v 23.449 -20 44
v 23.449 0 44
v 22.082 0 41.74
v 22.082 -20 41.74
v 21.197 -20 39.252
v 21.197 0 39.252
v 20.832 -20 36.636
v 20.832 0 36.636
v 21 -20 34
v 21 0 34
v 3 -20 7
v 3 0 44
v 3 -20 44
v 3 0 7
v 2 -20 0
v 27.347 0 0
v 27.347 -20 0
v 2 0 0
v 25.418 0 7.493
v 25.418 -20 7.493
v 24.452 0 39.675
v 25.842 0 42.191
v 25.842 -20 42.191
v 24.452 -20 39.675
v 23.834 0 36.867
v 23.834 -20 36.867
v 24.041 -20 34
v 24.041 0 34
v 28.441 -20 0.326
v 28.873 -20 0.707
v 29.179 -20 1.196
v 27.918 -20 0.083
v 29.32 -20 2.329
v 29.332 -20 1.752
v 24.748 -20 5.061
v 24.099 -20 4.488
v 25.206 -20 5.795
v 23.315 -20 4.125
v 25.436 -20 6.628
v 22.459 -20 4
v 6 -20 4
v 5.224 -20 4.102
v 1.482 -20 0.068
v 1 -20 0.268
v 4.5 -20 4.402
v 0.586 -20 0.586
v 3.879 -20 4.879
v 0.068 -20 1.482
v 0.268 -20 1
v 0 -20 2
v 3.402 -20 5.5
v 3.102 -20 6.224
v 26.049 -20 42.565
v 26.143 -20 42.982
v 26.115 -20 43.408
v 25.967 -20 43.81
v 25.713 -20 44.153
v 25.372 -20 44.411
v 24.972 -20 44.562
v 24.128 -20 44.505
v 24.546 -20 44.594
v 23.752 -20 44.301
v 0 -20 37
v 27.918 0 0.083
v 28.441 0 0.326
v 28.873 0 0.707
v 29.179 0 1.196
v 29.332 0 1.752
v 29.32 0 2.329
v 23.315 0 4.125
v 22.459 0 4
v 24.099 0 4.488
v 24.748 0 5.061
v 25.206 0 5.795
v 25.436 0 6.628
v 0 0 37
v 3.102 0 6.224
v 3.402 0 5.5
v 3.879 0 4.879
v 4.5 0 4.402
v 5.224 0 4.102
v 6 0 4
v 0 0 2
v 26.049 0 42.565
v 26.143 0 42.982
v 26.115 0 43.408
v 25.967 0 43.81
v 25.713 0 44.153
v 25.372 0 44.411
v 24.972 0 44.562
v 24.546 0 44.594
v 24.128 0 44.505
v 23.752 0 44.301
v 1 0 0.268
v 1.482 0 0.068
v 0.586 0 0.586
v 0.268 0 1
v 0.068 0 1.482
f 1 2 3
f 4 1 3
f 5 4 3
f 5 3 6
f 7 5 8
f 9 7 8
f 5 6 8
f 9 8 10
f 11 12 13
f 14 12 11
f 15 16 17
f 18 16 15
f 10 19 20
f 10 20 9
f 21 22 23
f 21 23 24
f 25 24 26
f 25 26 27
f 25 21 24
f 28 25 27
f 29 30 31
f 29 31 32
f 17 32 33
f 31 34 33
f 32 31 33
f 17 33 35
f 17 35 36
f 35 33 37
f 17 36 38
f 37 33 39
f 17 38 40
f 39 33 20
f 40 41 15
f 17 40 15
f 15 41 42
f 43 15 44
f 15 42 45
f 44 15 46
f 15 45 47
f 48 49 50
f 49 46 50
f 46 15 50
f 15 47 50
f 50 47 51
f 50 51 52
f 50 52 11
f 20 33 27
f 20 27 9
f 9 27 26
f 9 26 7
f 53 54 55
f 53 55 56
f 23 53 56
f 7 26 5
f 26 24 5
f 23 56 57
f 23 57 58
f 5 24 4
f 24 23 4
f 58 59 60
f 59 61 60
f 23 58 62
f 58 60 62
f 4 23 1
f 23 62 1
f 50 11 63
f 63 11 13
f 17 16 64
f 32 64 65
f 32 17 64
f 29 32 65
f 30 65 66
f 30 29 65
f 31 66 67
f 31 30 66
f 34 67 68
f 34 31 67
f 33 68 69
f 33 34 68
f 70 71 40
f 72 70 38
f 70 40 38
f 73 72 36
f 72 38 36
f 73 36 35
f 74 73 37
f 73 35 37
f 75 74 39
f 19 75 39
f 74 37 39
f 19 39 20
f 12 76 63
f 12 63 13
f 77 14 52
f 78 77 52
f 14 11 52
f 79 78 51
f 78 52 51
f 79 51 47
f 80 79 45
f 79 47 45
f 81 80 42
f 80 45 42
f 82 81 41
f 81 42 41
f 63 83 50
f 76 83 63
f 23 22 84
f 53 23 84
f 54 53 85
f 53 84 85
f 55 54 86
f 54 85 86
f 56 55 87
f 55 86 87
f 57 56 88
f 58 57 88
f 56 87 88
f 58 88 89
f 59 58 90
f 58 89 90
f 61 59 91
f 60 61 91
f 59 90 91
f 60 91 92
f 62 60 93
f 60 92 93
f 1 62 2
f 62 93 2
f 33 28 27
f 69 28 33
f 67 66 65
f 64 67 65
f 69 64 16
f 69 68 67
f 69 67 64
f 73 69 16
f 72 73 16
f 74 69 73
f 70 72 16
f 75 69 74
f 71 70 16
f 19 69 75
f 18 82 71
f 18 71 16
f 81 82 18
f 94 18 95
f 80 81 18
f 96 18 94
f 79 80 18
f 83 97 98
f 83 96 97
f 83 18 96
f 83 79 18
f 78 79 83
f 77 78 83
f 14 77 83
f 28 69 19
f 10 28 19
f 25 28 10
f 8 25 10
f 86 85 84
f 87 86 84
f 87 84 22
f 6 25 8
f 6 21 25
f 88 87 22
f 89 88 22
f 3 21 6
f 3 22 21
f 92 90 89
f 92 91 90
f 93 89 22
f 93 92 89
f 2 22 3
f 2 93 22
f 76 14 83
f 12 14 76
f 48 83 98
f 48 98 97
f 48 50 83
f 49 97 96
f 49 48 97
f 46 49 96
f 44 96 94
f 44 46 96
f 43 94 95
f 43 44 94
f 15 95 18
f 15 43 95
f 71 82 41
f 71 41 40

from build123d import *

# Parameters (mm, degrees)
PAD_DEPTH   = 20
FILLET_R    = 3
FILLET001_R = 2


with BuildPart() as part:
    # Sketch → Pad (new body)
    with BuildSketch(Plane.XZ):
        with BuildLine():
            Line((0, 0), (0, 37))
            Line((0, 37), (3, 44))
            Line((3, 44), (3, 4))
            Line((3, 4), (26, 4))
            Line((26, 4), (21, 34))
            ThreePointArc((23.448856, 44), (21.197055, 39.251589), (21, 34))
            ThreePointArc((25.84203, 42.190943), (25.551614, 44.294231), (23.448856, 44))
            ThreePointArc((25.84203, 42.190943), (24.041555, 38.293355), (24.041381, 34))
            Line((24.041381, 34), (29.708048, 0))
            Line((29.708048, 0), (0, 0))
        make_face()
    extrude(amount=PAD_DEPTH)

    # Fillet
    fillet_edges = [part.edges().sort_by_distance(p)[0] for p in [
        (26, -10, 4),
        (3, -10, 4),
    ]]
    fillet(fillet_edges, radius=FILLET_R)

    # Fillet001
    fillet001_edges = [part.edges().sort_by_distance(p)[0] for p in [
        (0, -10, 0),
        (29.708048, -10, 0),
    ]]
    fillet(fillet001_edges, radius=FILLET001_R)


solid = part.part
